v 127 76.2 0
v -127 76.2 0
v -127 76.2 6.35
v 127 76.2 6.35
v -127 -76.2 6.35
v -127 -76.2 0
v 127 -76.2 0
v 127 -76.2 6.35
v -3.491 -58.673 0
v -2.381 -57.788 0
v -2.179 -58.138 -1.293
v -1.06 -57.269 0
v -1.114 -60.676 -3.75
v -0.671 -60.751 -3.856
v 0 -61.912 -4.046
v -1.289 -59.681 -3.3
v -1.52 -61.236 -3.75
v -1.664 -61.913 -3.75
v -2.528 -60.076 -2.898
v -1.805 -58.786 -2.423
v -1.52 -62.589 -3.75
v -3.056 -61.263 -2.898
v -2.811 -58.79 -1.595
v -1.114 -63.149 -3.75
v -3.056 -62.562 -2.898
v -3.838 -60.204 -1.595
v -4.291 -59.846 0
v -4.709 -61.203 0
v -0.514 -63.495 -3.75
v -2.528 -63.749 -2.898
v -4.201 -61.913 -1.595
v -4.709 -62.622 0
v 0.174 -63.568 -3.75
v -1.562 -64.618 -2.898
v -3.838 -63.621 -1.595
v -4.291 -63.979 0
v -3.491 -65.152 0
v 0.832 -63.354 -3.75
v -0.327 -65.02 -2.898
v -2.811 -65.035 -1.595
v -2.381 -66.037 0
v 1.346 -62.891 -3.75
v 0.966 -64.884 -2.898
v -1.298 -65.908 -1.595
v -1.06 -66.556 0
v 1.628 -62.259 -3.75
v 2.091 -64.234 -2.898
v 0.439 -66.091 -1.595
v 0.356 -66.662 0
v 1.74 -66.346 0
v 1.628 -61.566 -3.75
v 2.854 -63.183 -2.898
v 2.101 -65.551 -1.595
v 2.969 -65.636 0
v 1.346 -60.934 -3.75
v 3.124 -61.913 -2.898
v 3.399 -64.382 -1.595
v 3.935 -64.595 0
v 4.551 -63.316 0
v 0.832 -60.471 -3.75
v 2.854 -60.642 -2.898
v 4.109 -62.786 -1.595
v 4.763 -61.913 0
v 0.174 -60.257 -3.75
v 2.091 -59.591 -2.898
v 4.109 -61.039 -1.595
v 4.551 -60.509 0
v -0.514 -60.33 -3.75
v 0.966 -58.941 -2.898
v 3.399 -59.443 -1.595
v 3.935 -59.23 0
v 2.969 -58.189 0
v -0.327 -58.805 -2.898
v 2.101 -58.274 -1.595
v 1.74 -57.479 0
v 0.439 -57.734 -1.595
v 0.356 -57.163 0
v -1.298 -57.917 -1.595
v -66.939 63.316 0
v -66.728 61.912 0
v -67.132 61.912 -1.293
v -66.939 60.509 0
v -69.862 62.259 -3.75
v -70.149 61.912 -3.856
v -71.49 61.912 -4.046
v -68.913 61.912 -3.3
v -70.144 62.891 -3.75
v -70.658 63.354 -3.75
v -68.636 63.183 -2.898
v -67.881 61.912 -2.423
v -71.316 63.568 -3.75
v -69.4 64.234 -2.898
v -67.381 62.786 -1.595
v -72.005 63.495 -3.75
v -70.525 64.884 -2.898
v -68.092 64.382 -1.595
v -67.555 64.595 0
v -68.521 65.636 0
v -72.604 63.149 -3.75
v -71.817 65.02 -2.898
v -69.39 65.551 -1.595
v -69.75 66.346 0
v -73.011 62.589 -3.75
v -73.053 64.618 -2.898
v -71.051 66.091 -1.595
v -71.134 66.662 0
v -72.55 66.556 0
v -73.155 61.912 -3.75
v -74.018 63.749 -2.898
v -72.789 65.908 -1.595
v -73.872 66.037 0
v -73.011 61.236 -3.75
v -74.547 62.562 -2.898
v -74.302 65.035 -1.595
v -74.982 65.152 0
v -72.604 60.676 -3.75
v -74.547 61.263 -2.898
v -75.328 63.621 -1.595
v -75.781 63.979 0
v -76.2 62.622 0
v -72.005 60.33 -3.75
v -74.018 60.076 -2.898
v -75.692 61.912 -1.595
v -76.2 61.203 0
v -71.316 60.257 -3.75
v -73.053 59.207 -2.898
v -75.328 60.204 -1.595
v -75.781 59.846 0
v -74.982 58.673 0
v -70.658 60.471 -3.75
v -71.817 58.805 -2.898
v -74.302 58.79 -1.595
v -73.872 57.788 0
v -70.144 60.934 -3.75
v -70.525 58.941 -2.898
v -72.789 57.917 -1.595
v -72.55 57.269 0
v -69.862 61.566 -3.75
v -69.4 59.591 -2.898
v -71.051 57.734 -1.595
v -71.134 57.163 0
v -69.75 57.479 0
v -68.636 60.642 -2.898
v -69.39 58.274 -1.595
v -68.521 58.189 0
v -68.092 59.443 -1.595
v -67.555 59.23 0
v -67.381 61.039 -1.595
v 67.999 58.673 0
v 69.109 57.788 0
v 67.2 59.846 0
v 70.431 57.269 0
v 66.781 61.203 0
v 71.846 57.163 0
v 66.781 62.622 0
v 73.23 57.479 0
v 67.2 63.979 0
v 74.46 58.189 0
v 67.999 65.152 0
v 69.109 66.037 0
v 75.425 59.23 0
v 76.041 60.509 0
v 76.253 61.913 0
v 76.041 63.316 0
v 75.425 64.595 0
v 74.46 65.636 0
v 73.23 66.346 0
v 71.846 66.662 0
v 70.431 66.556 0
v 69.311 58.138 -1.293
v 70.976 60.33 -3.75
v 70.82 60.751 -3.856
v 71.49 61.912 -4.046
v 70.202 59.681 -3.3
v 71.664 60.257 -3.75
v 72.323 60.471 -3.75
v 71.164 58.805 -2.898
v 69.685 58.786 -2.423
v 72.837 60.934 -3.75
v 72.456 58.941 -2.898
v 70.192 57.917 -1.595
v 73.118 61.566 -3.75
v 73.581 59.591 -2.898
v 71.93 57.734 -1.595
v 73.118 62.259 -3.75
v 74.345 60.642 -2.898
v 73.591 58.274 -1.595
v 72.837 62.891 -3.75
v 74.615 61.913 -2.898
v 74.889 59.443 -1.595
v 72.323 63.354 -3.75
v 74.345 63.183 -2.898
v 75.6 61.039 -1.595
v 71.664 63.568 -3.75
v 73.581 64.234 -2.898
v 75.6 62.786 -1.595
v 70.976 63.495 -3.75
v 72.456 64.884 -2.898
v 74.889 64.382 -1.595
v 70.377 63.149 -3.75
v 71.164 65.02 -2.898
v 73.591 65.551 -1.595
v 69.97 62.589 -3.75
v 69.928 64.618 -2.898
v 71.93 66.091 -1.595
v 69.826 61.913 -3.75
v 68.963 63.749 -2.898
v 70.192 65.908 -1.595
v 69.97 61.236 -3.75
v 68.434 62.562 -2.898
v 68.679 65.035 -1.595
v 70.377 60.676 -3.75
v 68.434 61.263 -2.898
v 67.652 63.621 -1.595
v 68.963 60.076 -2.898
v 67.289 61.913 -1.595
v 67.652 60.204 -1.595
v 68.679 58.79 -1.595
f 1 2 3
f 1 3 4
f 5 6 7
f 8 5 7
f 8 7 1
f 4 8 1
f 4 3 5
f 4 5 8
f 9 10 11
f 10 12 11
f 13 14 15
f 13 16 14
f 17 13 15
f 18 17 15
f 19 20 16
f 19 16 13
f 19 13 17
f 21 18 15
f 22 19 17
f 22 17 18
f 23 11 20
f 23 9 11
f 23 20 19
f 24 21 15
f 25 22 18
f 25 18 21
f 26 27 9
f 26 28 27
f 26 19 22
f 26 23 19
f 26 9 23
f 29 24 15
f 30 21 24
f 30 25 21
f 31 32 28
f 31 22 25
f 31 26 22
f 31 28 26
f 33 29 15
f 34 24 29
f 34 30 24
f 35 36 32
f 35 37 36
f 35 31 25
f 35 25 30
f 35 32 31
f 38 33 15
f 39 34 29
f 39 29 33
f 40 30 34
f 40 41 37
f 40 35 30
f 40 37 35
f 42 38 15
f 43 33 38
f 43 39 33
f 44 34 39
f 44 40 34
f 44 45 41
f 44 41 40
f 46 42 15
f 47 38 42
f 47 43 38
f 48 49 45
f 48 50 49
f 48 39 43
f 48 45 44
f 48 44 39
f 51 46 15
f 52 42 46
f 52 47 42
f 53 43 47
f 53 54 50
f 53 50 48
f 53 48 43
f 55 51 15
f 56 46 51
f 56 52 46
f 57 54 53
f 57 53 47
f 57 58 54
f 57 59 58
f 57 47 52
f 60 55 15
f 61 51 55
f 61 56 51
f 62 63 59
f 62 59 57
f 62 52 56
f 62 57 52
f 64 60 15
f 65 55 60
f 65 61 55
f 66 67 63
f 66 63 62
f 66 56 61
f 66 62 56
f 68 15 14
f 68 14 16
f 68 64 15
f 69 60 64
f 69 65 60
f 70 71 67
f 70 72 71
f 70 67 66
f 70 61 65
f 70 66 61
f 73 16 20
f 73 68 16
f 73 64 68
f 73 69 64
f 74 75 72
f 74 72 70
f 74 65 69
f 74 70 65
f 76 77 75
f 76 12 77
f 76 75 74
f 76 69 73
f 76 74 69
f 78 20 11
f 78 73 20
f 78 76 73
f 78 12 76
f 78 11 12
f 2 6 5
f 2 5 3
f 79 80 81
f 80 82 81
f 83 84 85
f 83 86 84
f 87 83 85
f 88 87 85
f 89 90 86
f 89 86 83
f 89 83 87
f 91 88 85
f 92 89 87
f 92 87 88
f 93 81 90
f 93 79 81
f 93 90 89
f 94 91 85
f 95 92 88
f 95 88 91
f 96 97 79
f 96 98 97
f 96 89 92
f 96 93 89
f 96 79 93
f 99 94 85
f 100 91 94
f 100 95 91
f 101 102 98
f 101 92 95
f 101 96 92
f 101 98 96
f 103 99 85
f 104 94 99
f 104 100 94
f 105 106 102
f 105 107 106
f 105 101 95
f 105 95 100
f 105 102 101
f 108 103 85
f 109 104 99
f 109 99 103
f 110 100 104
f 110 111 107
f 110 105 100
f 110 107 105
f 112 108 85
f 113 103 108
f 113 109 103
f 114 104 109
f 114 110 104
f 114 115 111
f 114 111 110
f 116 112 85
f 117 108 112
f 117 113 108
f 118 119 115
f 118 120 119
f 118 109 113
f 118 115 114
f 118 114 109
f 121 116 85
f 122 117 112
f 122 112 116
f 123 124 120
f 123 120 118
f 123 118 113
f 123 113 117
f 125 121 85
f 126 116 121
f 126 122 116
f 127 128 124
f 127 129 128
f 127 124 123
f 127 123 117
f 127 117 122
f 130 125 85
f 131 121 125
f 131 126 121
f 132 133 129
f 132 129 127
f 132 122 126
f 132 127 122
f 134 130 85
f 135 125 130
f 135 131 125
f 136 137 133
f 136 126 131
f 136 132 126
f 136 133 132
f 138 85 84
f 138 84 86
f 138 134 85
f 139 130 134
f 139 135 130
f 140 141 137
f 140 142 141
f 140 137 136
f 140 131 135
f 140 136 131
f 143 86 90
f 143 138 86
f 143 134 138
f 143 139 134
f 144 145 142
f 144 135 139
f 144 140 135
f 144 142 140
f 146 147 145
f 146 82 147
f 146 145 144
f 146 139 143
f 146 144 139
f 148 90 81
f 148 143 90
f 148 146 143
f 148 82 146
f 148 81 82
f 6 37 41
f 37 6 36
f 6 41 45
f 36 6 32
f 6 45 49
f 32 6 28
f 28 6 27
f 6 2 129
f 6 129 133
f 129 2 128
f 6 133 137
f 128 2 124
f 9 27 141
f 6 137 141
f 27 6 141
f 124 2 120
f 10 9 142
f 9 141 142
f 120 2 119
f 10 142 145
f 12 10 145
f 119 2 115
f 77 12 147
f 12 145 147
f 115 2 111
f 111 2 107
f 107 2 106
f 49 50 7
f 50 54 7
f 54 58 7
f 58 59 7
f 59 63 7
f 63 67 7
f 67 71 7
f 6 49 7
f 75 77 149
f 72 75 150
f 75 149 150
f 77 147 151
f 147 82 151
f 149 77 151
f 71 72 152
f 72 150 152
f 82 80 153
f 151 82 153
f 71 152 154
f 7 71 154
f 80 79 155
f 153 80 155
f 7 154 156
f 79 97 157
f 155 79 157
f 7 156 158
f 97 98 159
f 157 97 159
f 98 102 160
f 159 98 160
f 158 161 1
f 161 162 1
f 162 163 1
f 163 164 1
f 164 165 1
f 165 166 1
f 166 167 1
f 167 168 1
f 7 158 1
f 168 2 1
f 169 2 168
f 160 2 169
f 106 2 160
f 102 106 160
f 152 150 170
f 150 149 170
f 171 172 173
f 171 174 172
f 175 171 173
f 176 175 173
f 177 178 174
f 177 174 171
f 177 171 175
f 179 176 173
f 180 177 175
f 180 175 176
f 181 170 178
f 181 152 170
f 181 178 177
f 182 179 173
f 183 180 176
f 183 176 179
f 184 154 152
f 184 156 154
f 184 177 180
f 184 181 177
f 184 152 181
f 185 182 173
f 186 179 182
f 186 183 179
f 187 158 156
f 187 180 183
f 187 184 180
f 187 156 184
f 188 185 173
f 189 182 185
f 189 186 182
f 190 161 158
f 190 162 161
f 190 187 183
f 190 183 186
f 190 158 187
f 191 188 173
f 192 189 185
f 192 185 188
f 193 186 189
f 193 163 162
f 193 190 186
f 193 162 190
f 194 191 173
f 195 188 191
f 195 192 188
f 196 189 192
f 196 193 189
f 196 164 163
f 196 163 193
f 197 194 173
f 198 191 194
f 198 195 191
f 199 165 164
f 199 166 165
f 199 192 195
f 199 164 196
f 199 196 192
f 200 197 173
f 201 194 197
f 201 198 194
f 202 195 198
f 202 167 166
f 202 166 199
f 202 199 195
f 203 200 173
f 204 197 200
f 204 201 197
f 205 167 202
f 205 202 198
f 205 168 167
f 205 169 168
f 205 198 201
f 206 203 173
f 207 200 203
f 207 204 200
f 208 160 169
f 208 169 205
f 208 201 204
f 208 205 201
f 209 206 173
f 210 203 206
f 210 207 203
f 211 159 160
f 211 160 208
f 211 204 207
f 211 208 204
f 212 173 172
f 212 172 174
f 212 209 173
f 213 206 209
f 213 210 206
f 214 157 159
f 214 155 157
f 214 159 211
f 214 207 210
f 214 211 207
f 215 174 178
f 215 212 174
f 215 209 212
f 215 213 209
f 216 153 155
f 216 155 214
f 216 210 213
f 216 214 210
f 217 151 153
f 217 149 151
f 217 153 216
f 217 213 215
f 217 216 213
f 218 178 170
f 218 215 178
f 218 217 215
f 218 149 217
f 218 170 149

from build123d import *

# Parameters (mm, degrees)
F0_W            = 254
F0_H            = 152.4
F1_DEPTH        = 6.35
F5_COPIES_COUNT = 3


# Not quite as in the source:
# - a pattern or mirror of a feature is missing from the dataset's text; its kind, count and spacing are read off the source's solid


with BuildPart() as f1:
    # F0 (on Top) → F1 (new body)
    with BuildSketch(Plane.XY):
        Rectangle(F0_W, F0_H)
    extrude(amount=F1_DEPTH)

    # F4 (on face) → F5 (revolve)
    with BuildSketch(Plane.XZ.offset(-61.9125)):
        with BuildLine():
            Line((-71.4903970824, 0.7803010637), (-71.4903970824, -4.0456989363))
            ThreePointArc((-71.4903970824, -4.0456989363), (-68.0778997564, -2.6321962623), (-66.6643970824, 0.7803010637))
            Line((-66.6643970824, 0.7803010637), (-71.4903970824, 0.7803010637))
        make_face()
    f5 = revolve(axis=Axis((-71.4903970824, 61.9125, -1.6326989363), (0, 0, 1)))

    # F5_copies: F5 ×3 about axis
    f5_copies_axis = Axis((0, 20.6375, 0), (0, 0, 1))
    for i in range(1, F5_COPIES_COUNT):
        add(f5.rotate(f5_copies_axis, i * 360 / F5_COPIES_COUNT))


solid = f1.part
